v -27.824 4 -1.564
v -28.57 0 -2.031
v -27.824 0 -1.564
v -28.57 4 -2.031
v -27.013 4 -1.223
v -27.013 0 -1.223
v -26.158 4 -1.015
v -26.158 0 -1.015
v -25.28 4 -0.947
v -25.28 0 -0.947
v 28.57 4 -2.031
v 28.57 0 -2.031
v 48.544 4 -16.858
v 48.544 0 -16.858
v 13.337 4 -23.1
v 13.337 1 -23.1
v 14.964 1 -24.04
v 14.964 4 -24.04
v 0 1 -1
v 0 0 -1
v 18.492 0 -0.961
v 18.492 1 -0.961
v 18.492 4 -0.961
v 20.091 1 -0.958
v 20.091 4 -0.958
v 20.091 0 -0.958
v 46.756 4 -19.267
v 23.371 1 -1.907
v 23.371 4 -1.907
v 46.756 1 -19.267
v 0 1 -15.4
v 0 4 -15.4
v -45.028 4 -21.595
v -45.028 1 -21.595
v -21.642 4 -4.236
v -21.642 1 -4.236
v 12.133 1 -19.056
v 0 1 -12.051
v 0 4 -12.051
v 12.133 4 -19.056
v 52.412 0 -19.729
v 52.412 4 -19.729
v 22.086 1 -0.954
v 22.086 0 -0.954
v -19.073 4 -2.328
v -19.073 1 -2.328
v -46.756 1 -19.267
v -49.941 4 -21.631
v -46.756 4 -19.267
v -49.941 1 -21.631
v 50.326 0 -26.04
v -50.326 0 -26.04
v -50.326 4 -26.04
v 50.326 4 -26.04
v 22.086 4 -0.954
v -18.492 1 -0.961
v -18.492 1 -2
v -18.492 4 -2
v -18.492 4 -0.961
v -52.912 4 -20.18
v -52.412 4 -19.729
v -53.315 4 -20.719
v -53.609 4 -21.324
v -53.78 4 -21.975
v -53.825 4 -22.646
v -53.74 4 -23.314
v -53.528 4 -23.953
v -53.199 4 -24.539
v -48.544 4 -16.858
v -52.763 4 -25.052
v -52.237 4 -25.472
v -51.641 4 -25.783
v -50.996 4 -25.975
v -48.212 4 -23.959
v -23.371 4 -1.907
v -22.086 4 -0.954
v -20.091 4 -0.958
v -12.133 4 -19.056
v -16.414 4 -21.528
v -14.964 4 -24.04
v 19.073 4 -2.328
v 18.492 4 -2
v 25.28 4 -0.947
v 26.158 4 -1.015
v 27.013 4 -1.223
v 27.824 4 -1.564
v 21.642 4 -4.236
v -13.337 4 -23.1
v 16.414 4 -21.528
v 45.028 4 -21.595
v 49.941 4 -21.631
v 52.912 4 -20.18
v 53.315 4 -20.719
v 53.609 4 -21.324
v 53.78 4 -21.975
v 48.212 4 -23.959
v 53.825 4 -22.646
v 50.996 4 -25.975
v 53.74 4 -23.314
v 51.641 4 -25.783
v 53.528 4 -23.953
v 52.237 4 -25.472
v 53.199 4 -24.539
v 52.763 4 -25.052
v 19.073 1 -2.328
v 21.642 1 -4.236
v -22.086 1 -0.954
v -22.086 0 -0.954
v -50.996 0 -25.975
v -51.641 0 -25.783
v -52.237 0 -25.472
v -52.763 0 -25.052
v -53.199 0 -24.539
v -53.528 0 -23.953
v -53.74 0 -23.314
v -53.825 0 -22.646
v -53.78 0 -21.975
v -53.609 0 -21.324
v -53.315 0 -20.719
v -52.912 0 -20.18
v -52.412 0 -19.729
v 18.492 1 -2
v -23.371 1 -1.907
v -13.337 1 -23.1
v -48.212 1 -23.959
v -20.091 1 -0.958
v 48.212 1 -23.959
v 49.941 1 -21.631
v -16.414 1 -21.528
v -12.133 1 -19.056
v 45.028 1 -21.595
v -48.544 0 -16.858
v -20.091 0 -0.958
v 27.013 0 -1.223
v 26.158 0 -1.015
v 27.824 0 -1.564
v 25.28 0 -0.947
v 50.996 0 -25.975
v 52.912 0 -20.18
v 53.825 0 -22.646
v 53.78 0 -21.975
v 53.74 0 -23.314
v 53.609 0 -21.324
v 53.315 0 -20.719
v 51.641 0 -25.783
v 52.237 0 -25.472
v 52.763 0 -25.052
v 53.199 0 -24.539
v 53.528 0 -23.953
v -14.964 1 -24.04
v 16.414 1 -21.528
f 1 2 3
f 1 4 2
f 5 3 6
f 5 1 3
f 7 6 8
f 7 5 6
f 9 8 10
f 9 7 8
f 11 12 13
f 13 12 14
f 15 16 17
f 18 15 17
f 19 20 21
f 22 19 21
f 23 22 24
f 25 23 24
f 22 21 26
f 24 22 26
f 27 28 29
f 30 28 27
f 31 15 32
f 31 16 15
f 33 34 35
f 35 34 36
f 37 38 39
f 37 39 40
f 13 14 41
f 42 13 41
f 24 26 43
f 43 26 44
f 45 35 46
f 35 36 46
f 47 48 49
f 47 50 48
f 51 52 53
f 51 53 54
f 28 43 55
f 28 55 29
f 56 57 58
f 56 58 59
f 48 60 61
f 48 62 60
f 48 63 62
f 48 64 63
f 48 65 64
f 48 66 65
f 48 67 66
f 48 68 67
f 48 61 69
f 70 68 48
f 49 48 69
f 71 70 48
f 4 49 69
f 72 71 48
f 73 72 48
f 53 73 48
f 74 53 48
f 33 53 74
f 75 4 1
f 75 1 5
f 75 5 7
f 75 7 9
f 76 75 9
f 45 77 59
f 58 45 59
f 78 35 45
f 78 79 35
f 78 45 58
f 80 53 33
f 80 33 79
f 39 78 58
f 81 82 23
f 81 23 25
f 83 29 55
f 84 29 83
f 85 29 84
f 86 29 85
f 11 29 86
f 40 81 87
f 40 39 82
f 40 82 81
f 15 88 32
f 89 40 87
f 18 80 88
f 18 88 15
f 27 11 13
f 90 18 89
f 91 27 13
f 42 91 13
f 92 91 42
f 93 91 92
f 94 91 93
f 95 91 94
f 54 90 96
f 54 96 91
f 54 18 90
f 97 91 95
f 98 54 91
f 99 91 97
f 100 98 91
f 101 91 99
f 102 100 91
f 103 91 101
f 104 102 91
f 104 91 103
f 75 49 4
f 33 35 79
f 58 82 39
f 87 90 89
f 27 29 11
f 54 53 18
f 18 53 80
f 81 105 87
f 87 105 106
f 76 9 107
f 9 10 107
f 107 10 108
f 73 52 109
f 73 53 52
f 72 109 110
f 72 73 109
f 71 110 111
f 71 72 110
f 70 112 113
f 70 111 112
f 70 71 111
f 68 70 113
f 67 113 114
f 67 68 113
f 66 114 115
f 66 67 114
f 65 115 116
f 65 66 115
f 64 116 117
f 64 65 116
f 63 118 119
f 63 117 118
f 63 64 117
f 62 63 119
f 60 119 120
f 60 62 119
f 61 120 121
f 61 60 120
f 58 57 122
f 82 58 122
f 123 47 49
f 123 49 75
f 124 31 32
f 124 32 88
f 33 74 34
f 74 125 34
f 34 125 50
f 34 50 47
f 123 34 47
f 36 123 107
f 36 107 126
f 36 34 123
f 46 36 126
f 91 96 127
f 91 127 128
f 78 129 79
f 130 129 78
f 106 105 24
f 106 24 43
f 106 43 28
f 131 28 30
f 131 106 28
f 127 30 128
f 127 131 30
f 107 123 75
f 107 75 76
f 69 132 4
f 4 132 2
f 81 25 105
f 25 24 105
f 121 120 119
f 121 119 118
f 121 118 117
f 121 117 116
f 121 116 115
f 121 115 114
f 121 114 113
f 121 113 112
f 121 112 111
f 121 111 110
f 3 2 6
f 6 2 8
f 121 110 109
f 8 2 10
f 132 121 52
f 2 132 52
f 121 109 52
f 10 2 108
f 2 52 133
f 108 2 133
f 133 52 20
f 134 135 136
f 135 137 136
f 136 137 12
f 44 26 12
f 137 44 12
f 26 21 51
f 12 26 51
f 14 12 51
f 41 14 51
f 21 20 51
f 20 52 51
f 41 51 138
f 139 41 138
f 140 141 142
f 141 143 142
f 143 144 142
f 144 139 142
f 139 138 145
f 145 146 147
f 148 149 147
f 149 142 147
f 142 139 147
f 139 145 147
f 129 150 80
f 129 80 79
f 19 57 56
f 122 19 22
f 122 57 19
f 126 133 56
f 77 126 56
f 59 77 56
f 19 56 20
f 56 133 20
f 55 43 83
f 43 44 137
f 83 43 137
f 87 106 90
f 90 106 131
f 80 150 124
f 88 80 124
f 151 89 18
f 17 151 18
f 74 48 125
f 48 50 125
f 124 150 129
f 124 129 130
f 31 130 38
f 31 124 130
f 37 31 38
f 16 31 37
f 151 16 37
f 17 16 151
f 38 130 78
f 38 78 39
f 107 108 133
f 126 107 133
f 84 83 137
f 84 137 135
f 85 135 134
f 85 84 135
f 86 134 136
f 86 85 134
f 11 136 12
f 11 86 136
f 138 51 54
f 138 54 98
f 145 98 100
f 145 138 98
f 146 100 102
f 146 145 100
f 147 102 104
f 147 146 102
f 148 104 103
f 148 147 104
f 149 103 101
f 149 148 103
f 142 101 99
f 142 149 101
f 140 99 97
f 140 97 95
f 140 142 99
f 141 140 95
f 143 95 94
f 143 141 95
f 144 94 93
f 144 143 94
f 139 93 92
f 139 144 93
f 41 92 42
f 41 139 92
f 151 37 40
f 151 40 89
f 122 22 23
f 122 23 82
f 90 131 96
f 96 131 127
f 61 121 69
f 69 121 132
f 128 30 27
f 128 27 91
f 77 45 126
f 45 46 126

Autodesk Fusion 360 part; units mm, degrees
sketch "Sketch1" plane through (0, 0, 0) normal (0, 1, 0) x (1, 0, 0)
  line L0 (0, 0) -> (0, 239.8445)
  line L1 (0, 0) -> (0, 25)
  line L2 (0, 0) -> (-94.6434, 191.0764)
  line L3 (0, 0) -> (0, 15.4)
  line L4 (-10.6829, 21.5678) -> (-95.942, 70.7921)
  line L5 (13.3368, 23.1) -> (-199.4619, 9.5254)
  line L6 (-26.6736, 0) -> (-59.8805, 24.6504)
  line L7 (-33.0314, -39.3634) -> (-81.6324, 168.2553)
  line L8 (-33.0314, -39.3634) -> (21.6354, 194.1681)
  line L9 (-33.0314, -39.3634) -> (0, -39.3634)
  line L10 (-22.0861, 0.9535) -> (-23.3706, 1.907)
  line L11 (-49.9408, 21.6308) -> (-57.7944, 27.4607)
  line L12 (-23.3706, 1.907) -> (-46.756, 19.2666)
  line L13 (0, 15.4) -> (-10.6829, 21.5678)
  line L14 (-10.6829, 21.5678) -> (-14.9643, 24.0396)
  line L15 (0, 11.9359) -> (-12.1829, 18.9697)
  line L16 (-12.1829, 18.9697) -> (-16.4643, 21.4416)
  line L17 (-16.4643, 21.4416) -> (-14.9643, 24.0396)
  line L18 (-14.9643, 24.0396) -> (-59.0578, 24.0396)
  line L19 (-20.0907, 0.9577) -> (-19.0135, 2.4088)
  line L20 (-48.1526, 24.0396) -> (-49.9408, 21.6308)
  line L21 (-19.0135, 2.4088) -> (-21.5824, 4.3158)
  line L22 (-21.5824, 4.3158) -> (-44.9679, 21.6755)
  line L23 (-44.9679, 21.6755) -> (-48.1526, 24.0396)
  line L24 (-57.7944, 27.4607) -> (-56.0062, 29.8696)
  line L25 (-46.756, 19.2666) -> (-49.9408, 21.6308)
  line L26 (-48.1526, 24.0396) -> (-56.0062, 29.8696)
  line L27 (0, 0) -> (0, 1)
  line L28 (0, 1) -> (-20.0907, 0.9577)
  line L29 (13.3368, 23.1) -> (-20.5394, 3.5416)
  line L30 (-23.3706, 1.907) -> (-194.3746, -96.8223)
  line L31 (-20.5394, 3.5416) -> (-23.3706, 1.907)
  line L32 (-22.0861, 0.9535) -> (-20.298, 3.3623)
  line L33 (-20.0907, 0.9577) -> (-22.0861, 0.9535)
  line L34 (0, 0) -> (0, 25)
  line L35 (0, 1) -> (0, 2)
  line L36 (0, 2) -> (-19.317, 2)
  line L37 (-19.317, 2) -> (-19.3148, 0.9593)
  line L38 (46.756, 19.2666) -> (49.9408, 21.6308)
  line L39 (48.1526, 24.0396) -> (49.9408, 21.6308)
  line L40 (44.9679, 21.6755) -> (48.1526, 24.0396)
  line L41 (21.5824, 4.3158) -> (44.9679, 21.6755)
  line L42 (23.3706, 1.907) -> (46.756, 19.2666)
  line L43 (22.0861, 0.9535) -> (23.3706, 1.907)
  line L44 (20.0907, 0.9577) -> (19.0135, 2.4088)
  line L45 (19.0135, 2.4088) -> (21.5824, 4.3158)
  line L46 (20.0907, 0.9577) -> (22.0861, 0.9535)
  line L47 (0, 11.9359) -> (12.1829, 18.9697)
  line L48 (16.4643, 21.4416) -> (14.9643, 24.0396)
  line L49 (12.1829, 18.9697) -> (16.4643, 21.4416)
  line L50 (10.6829, 21.5678) -> (14.9643, 24.0396)
  line L51 (0, 15.4) -> (10.6829, 21.5678)
  line L52 (0, 1) -> (20.0907, 0.9577)
  line L53 (14.9643, 24.0396) -> (59.0578, 24.0396)
  line L54 (0, 2) -> (19.317, 2)
  line L55 (19.317, 2) -> (19.3148, 0.9593)
  line L56 (-14.9643, 24.0396) -> (14.9643, 24.0396)
  line L57 (0, 1) -> (35.9633, 0.9243)
  line L58 (0, 1) -> (-40.1034, 0.9577)
  line L59 (-23.8743, -1.4553) -> (-25.1587, -0.5018)
  line L60 (-25.1587, -0.5018) -> (-48.5442, 16.8578)
  line L61 (-48.5442, 16.8578) -> (-51.7289, 19.2219)
  line L62 (-51.7289, 19.2219) -> (-60.9132, 26.0396)
  line L63 (-14.9643, 26.0396) -> (-60.9132, 26.0396)
  line L64 (-14.9643, 26.0396) -> (14.9643, 26.0396)
  line L65 (14.9643, 26.0396) -> (60.9132, 26.0396)
  line L66 (23.8743, -1.4553) -> (25.1587, -0.5018)
  line L67 (25.1587, -0.5018) -> (48.5442, 16.8578)
  line L68 (28.529, 2) -> (60.9132, 26.0396)
  line L69 (18.4918, 0.9611) -> (18.4918, 2)
  line L70 (-18.5464, 0.9609) -> (-18.5464, 2)
  line L71 (19.1327, 2.2483) -> (21.7016, 4.1552)
  line L72 (21.7016, 4.1552) -> (45.0871, 21.5149)
  line L73 (45.0871, 21.5149) -> (48.2719, 23.879)
  line L74 (-0.1, 12.1091) -> (12.0829, 19.1429)
  line L75 (12.0829, 19.1429) -> (16.3643, 21.6148)
  line L76 (-0.05, 12.0225) -> (12.1329, 19.0563)
  line L77 (12.1329, 19.0563) -> (16.4143, 21.5282)
  line L78 (19.0731, 2.3285) -> (21.642, 4.2355)
  line L79 (21.642, 4.2355) -> (45.0275, 21.5952)
  line L80 (45.0275, 21.5952) -> (48.2123, 23.9593)
  dimension "d9" = 25
  dimension "d11" = 15.4
  dimension "d21" = 1
  dimension "d37" = 0.2
  dimension "d38" = 0.2
  dimension "d39" = 0.1
  dimension "d40" = 0.1
extrude "Extrude2" add sketch "Sketch1" along normal blind 1 contours L0 L1 L3 L34 L35 L52 L54 L57 L69 | L0 L1 L3 L34 L40 L41 L44 L45 L47 L48 L49 L53 L54 | L52 L54 L55 L57 L69 | L0 L1 L3 L34 L47 L48 L49 L76 L77 | L44 L52 L55 L57 | L0 L1 L3 L34 L48 L74 L75 L76 L77 | L38 L39 L42 L43 L44 L46 L57 L71 L72 L73 | L0 L1 L3 L29 L34 L48 L50 L51 L74 L75 | L0 L1 L5 L29 L34 L50 L51 | L39 L44 L71 L72 L73 L78 L79 L80 | L38 L39 L42 L43 L53 L57 L67 L68 | L0 L1 L5 L34 L50 L56 | L39 L40 L41 L44 L45 L78 L79 L80 | L0 L1 L34 L53 L56 L64 L65 L68 makes body 1
extrude "Extrude3" add sketch "Sketch1" along normal blind 4 separate body contours L0 L1 L3 L34 L40 L41 L44 L45 L47 L48 L49 L53 L54 | L52 L54 L55 L57 L69 | L0 L1 L3 L34 L47 L48 L49 L76 L77 | L44 L52 L55 L57 | L0 L1 L5 L29 L34 L50 L51 | L38 L39 L42 L43 L53 L57 L67 L68 | L0 L1 L5 L34 L50 L56 | L39 L40 L41 L44 L45 L78 L79 L80 | L0 L1 L34 L53 L56 L64 L65 L68 makes body 2
mirror "Mirror1" about plane through (0, 0, 0) normal (1, 0, 0) of bodies 2 1 makes body 3 at (-27.8999, 0, -15.9387) makes body 4 at (-29.3394, 1, -17.6741)
combine "Combine1" operation add target body 4 tool bodies 3 2 1
fillet "Fillet2" radius 3.5 1 edges at (60.9132, 2, -26.0396) on bodies 4
fillet "Fillet3" radius 5.5 1 edges at (27.105, 2, -0.9429) on bodies 4
fillet "Fillet4" radius 5.5 1 edges at (-27.105, 2, -0.9429) on bodies 4
fillet "Fillet5" radius 3.5 1 edges at (-60.9132, 2, -26.0396) on bodies 4
equation "AA = 1.1 mm"
